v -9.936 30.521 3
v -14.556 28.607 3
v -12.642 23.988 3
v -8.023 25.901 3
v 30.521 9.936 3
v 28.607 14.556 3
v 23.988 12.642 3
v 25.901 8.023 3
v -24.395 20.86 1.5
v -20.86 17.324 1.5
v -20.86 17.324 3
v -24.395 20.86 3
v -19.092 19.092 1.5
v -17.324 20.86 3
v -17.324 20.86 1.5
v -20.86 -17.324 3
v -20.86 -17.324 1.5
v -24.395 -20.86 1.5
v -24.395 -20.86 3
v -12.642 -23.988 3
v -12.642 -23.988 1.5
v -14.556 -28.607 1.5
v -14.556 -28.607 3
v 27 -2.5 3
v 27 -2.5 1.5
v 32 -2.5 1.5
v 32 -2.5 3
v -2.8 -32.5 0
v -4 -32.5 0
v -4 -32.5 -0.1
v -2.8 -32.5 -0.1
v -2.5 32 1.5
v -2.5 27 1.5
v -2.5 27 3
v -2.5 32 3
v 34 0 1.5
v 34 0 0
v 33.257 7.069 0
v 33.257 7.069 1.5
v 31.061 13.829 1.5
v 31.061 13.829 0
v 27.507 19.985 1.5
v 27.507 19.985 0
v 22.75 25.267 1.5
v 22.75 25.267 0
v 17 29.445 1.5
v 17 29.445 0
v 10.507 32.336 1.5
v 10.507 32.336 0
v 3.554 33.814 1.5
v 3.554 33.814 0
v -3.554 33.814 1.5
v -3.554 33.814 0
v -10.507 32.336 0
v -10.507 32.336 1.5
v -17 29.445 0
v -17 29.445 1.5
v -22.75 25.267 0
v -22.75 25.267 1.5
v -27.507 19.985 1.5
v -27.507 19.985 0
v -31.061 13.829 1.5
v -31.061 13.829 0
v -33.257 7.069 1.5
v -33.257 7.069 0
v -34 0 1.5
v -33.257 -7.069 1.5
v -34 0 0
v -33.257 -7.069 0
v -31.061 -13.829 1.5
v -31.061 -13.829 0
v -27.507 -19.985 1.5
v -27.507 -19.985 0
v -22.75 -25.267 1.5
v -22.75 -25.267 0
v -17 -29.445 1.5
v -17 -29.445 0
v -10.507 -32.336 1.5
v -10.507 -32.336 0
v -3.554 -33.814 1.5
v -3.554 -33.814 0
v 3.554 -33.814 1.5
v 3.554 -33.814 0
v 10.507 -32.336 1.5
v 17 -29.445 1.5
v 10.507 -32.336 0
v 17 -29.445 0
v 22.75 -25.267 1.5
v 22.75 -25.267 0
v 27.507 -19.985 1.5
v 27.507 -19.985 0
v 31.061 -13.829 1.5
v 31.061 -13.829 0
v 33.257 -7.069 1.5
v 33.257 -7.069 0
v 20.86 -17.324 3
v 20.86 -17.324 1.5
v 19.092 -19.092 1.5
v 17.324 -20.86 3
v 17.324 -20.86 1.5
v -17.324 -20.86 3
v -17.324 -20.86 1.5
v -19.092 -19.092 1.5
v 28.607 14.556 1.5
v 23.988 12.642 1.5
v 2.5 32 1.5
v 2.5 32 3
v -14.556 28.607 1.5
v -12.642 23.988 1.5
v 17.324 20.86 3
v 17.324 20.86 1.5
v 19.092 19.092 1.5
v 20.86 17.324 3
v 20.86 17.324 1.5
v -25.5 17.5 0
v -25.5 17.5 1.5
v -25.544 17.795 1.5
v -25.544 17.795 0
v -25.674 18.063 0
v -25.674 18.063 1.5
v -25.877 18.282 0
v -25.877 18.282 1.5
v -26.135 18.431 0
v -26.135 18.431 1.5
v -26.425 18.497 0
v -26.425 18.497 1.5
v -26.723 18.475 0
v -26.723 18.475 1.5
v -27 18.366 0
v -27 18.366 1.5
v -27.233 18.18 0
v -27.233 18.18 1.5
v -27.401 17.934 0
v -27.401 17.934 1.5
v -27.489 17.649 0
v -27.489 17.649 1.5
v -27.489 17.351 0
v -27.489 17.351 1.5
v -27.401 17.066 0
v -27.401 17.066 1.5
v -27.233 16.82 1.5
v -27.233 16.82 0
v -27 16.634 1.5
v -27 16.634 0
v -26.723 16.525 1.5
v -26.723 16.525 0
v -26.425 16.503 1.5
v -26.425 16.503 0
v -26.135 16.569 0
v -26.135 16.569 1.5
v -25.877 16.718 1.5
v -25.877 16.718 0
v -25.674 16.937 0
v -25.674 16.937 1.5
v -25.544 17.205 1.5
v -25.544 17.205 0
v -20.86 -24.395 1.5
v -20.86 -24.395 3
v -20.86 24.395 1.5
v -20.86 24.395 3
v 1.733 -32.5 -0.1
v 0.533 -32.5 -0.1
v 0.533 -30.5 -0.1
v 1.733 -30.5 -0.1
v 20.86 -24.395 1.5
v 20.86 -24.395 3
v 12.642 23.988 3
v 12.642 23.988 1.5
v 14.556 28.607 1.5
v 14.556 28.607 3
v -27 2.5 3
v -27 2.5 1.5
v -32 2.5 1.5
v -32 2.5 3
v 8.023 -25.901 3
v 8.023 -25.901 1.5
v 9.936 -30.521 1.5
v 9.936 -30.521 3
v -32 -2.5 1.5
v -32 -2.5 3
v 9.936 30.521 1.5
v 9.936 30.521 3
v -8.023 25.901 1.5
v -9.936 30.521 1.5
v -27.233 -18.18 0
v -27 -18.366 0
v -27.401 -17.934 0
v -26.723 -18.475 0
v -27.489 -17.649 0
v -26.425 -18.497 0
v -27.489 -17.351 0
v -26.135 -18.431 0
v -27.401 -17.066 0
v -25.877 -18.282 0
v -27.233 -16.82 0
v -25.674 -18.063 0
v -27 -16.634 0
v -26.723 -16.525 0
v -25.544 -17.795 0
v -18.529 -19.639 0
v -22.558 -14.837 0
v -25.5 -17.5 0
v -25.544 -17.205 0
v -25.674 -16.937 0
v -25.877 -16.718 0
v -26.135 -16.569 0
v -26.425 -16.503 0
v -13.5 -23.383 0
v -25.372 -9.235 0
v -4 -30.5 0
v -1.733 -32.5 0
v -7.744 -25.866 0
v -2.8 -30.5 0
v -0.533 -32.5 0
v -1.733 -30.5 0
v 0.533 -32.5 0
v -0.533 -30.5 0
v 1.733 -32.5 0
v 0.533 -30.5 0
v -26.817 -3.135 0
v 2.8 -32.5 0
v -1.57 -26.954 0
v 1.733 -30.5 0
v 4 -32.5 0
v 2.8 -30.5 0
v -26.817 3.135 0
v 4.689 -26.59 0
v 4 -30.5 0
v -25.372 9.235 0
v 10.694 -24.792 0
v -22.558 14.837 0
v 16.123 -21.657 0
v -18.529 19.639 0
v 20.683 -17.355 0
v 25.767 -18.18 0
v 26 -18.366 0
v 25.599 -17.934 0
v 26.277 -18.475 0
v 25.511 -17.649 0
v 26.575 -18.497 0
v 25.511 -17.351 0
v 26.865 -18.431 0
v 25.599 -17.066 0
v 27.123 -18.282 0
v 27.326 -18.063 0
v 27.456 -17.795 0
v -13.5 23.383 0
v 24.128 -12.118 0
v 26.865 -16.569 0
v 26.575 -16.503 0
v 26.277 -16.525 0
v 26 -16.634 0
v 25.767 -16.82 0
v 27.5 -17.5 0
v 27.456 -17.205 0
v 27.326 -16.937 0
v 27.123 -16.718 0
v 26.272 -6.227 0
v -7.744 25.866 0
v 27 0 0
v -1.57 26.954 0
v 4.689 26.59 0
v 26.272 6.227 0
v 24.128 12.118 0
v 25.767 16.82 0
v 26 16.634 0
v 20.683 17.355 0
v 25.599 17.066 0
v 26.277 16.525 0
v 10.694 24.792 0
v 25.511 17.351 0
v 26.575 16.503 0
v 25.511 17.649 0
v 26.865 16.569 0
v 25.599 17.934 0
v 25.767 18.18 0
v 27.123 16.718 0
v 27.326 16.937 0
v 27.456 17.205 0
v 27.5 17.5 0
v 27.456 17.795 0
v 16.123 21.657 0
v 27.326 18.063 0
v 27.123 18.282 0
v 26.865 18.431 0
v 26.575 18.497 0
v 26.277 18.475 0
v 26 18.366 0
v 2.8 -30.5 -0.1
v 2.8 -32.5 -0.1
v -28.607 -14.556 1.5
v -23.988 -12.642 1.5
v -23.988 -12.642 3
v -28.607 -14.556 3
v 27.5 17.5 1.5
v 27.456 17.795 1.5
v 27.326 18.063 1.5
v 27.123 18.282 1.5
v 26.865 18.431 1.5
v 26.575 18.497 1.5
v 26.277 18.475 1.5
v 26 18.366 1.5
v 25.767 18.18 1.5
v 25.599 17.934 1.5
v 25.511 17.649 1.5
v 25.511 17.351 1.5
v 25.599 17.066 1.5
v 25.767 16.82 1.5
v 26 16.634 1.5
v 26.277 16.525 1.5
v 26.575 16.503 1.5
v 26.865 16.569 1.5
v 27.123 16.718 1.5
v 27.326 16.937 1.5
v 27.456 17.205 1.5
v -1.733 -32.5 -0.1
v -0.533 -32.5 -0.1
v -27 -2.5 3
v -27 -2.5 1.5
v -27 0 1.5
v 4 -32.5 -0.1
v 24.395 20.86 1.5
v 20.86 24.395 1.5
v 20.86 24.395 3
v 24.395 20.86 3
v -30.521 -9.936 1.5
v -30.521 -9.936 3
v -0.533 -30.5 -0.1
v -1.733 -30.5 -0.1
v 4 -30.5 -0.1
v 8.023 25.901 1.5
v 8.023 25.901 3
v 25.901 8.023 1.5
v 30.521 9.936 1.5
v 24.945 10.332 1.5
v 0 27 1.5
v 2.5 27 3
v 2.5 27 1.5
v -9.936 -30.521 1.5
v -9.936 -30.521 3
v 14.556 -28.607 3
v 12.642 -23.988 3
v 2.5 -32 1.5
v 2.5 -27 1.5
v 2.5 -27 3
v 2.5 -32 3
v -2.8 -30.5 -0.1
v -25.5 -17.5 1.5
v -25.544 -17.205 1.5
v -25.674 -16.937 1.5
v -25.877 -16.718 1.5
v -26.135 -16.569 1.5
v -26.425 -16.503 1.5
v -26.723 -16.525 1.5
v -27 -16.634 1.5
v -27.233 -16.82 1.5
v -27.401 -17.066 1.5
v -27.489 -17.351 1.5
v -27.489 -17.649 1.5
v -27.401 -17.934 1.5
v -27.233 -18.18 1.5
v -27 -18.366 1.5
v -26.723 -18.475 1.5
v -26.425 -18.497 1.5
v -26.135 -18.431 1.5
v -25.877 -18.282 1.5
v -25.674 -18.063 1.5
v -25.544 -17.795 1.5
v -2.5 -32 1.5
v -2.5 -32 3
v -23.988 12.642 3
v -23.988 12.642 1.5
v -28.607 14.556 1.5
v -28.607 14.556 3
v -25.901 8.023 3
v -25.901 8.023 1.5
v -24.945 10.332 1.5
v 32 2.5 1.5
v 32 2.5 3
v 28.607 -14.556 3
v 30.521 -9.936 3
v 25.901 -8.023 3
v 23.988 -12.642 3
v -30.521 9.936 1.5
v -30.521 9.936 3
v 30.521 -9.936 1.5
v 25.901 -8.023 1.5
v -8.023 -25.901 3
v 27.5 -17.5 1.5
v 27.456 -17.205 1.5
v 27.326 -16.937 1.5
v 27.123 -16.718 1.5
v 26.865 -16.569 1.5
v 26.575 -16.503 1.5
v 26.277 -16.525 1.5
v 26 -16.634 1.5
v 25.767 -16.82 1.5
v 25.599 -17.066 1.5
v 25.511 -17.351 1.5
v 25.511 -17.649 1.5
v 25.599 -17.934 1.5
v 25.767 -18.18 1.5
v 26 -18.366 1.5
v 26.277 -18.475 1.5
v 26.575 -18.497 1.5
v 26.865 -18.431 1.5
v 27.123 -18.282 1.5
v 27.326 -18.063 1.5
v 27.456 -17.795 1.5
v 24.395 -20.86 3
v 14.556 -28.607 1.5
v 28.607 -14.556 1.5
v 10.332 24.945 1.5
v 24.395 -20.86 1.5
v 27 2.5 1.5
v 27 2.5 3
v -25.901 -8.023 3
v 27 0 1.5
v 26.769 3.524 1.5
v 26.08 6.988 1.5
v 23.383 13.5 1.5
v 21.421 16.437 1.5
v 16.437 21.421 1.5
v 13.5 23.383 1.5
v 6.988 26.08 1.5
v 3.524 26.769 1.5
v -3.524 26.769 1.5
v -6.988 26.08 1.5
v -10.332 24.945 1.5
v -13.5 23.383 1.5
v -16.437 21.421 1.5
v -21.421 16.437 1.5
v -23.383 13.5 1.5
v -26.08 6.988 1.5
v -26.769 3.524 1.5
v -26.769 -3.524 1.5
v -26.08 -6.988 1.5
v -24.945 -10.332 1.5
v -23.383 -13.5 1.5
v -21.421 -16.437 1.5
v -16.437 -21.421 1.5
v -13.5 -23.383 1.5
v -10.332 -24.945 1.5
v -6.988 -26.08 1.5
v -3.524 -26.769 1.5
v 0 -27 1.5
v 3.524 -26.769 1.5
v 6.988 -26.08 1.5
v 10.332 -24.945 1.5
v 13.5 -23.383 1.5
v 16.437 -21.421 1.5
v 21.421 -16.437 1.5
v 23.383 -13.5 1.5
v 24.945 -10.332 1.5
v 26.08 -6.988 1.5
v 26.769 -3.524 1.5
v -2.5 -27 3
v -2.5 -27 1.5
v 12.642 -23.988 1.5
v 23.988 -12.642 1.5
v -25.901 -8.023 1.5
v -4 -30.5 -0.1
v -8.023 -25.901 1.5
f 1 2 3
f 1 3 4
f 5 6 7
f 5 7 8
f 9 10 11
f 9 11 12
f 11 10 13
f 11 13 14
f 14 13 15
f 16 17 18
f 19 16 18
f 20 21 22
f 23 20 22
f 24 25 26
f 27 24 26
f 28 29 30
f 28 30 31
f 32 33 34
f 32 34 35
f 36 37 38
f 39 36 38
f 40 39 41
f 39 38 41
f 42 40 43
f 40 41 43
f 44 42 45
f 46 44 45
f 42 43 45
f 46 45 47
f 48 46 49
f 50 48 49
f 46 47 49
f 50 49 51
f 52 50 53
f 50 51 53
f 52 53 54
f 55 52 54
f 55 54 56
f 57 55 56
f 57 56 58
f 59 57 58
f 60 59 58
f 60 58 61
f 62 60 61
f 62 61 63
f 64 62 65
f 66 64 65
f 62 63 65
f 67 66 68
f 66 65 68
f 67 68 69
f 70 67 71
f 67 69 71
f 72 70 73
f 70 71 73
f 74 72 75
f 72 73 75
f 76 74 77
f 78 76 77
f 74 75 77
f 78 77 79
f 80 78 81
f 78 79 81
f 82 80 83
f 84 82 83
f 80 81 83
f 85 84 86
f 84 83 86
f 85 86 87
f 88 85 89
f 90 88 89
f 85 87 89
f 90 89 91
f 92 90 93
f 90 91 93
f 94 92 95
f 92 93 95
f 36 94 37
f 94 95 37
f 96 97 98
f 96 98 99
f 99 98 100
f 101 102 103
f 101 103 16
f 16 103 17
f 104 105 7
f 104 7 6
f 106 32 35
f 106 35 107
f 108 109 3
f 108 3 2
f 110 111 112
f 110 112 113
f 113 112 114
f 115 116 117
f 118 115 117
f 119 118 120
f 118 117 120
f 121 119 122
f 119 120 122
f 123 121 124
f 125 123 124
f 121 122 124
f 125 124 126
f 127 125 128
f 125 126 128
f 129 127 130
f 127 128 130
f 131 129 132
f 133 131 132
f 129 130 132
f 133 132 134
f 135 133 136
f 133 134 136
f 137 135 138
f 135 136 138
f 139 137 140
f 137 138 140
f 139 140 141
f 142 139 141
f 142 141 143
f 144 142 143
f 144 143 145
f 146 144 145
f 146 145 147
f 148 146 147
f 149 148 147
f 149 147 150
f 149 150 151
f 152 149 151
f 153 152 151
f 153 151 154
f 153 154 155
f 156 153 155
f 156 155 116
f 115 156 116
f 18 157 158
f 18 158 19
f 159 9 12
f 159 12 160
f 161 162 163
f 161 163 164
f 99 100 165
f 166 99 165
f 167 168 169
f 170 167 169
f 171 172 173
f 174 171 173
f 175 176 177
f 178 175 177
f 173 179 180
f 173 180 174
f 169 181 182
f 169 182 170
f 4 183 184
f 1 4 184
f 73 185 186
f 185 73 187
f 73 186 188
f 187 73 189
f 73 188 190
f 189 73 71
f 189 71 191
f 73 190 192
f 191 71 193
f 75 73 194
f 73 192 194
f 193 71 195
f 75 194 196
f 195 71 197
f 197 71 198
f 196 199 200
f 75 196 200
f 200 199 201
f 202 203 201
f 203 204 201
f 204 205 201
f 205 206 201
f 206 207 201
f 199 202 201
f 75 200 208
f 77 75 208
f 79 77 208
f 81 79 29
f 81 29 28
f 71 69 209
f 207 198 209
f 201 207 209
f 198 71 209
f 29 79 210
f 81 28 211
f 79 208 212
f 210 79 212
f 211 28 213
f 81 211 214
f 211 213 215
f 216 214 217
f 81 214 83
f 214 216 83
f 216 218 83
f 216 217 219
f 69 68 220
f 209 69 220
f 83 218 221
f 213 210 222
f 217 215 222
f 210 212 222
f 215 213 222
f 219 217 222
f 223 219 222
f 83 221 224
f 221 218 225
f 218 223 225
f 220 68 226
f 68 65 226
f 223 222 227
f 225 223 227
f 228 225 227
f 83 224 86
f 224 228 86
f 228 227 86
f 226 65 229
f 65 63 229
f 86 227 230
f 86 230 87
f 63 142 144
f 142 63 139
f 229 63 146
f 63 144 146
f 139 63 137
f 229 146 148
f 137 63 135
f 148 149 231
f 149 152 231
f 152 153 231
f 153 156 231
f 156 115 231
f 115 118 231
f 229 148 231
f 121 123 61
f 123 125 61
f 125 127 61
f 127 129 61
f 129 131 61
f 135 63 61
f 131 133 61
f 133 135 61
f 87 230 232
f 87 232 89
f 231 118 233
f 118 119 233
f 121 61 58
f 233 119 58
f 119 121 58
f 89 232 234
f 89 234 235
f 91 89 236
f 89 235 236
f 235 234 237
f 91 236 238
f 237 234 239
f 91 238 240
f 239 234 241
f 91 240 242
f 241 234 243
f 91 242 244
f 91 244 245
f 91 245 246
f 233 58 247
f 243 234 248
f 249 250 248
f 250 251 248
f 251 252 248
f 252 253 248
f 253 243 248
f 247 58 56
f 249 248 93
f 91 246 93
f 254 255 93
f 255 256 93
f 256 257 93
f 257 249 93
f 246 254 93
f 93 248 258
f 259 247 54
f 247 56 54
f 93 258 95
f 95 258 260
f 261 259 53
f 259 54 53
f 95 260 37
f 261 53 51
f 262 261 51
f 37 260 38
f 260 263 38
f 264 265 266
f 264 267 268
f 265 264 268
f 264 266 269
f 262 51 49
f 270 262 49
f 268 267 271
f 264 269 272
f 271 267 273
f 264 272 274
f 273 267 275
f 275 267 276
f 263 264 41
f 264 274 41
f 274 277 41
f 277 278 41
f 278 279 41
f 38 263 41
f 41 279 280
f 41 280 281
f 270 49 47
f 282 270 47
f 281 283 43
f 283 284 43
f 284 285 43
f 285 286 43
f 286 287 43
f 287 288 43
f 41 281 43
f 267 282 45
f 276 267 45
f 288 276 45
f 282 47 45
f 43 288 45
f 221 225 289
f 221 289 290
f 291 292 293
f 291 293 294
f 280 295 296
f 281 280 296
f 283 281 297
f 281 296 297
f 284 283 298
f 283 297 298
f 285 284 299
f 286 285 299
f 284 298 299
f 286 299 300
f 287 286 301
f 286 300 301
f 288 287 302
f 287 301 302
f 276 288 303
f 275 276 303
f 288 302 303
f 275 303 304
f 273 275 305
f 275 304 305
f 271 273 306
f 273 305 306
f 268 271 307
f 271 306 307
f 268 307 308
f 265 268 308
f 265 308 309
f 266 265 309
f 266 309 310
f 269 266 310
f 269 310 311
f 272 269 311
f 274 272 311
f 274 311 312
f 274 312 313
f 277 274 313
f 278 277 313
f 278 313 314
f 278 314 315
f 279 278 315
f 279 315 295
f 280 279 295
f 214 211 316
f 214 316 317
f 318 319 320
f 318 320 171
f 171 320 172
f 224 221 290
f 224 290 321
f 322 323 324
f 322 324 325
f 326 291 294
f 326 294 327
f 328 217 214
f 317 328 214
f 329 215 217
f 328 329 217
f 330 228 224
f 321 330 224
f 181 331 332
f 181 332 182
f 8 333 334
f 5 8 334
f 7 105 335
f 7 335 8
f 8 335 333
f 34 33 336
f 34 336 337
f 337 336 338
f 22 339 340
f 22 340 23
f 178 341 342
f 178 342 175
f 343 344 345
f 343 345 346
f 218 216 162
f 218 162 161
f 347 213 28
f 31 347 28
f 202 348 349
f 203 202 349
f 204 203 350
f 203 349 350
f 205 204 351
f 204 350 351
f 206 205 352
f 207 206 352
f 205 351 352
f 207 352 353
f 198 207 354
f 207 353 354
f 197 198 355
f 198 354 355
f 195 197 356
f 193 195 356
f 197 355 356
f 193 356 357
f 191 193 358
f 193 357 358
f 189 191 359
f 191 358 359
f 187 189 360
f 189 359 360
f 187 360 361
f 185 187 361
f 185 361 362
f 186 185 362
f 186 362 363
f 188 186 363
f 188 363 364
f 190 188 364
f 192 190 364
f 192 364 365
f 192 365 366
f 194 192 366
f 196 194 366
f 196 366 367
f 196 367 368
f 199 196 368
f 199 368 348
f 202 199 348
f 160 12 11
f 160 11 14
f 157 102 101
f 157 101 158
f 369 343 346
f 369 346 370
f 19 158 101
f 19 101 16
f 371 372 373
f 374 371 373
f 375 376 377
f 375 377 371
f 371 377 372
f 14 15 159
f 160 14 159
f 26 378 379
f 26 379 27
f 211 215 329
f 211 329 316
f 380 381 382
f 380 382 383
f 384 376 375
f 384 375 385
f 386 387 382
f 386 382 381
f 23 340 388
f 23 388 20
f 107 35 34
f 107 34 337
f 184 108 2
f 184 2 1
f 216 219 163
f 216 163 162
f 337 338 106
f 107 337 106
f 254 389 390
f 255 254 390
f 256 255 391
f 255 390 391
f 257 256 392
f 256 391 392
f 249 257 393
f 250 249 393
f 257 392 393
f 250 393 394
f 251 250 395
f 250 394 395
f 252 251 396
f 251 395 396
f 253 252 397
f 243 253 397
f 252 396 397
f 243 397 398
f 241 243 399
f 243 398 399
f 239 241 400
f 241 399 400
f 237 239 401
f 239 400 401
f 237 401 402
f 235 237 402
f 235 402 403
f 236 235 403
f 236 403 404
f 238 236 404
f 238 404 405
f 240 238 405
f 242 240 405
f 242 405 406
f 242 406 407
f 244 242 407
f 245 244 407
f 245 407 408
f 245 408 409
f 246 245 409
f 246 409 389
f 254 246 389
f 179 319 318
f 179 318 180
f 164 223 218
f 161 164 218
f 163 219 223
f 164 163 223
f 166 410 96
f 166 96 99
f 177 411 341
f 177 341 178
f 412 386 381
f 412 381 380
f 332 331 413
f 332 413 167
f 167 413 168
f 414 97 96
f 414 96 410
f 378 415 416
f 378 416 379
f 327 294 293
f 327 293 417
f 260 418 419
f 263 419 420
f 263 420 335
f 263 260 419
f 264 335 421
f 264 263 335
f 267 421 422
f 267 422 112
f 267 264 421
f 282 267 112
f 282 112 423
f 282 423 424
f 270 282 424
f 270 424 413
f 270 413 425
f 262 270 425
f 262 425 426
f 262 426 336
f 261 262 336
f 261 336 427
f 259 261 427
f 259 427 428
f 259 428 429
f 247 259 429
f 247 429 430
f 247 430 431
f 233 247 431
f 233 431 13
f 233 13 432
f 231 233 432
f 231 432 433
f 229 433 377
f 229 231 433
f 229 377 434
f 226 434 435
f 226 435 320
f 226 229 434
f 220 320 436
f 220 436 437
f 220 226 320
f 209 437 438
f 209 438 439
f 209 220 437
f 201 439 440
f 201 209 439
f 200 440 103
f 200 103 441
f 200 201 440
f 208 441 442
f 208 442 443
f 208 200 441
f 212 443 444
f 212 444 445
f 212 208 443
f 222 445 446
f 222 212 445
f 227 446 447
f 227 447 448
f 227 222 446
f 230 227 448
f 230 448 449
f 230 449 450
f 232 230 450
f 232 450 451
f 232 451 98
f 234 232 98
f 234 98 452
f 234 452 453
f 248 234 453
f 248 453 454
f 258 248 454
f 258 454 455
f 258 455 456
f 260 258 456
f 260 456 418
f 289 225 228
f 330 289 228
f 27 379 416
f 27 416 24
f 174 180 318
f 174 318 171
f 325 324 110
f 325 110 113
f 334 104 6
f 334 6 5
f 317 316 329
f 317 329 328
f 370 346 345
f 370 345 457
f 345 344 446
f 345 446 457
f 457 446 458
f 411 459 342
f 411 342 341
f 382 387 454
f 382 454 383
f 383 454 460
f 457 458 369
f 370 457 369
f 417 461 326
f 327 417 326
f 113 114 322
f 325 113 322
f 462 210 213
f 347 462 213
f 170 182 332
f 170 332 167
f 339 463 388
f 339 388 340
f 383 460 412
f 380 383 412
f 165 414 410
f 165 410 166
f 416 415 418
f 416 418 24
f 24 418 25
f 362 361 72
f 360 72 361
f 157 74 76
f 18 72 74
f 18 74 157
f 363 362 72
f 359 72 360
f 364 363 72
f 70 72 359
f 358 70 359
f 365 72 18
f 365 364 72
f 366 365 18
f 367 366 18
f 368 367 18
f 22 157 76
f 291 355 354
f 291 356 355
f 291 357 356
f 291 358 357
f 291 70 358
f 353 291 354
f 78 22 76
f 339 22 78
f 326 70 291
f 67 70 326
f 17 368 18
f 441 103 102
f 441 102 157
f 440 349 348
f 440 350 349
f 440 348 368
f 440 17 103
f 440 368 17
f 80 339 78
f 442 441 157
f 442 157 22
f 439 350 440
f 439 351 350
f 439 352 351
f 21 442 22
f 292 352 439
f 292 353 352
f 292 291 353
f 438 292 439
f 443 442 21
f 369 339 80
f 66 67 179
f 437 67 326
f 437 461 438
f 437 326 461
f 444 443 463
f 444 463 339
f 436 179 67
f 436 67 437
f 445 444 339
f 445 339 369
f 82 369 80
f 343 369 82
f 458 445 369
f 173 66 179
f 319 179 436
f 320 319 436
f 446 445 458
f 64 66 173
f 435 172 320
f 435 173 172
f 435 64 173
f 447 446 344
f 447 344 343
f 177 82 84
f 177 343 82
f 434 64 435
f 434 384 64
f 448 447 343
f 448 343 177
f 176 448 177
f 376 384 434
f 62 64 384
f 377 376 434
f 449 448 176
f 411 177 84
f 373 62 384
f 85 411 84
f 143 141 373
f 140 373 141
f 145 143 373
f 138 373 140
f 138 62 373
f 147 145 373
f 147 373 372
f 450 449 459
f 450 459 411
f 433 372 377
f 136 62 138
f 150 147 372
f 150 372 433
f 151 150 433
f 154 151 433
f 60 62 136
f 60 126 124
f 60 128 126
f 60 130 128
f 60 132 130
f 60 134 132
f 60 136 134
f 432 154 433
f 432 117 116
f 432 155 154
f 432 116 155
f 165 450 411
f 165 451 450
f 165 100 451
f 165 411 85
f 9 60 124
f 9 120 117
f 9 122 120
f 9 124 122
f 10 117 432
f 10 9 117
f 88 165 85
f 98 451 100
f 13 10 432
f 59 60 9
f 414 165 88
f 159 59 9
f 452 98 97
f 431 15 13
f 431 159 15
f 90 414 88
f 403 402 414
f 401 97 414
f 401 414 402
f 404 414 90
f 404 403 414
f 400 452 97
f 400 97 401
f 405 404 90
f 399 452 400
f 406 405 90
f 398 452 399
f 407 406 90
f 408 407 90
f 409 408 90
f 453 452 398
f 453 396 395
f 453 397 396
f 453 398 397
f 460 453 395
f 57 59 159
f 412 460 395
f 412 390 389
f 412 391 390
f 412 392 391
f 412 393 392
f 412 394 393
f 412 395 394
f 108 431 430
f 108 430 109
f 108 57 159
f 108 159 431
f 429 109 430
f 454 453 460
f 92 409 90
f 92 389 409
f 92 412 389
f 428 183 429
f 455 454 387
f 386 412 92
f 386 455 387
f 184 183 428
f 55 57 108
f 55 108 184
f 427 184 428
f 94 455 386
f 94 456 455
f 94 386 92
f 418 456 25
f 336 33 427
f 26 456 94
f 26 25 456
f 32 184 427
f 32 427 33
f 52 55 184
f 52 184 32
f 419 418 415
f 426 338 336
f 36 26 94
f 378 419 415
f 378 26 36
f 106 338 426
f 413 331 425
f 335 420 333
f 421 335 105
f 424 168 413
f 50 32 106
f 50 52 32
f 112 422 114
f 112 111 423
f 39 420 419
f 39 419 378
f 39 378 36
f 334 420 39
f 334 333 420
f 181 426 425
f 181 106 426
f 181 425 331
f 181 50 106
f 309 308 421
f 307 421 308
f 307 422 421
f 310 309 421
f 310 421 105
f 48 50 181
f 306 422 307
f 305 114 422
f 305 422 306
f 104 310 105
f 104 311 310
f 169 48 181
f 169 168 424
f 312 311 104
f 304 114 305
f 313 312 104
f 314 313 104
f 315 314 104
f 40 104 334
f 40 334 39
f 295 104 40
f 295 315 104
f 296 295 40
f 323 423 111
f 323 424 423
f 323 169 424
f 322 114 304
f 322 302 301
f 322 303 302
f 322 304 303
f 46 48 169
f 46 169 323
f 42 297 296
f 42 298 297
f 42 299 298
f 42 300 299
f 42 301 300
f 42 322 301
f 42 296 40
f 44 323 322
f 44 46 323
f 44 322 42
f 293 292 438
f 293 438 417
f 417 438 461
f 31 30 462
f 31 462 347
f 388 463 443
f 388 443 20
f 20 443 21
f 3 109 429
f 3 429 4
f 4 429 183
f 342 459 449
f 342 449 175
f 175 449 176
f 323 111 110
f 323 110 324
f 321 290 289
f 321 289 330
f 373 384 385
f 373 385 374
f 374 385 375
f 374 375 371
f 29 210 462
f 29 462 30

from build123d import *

# Parameters (mm, degrees)
SKETCH_R           = 34
SKETCH_R_2         = 27
PAD_DEPTH          = 1.5
SKETCH001_W        = 1.2
SKETCH001_H        = 2
PAD001_DEPTH       = 0.1
SKETCH002_R        = 1
POCKET_DEPTH       = 1.601
SKETCH003_W        = 5
SKETCH003_H        = 5
PAD002_DEPTH       = 1.5
POLARPATTERN_COUNT = 16


with BuildPart() as part:
    # Sketch → Pad (new body)
    with BuildSketch(Plane.XY):
        Circle(SKETCH_R)
        Circle(SKETCH_R_2, mode=Mode.SUBTRACT)
    extrude(amount=PAD_DEPTH)

    # Sketch001 (on Face3 of Pad) → Pad001 (join)
    with BuildSketch(Plane(origin=(0, 0, 0), x_dir=(1, 0, 0), z_dir=(0, 0, -1))):
        with Locations((-3.4, 31.5)):
            Rectangle(SKETCH001_W, SKETCH001_H)
        with Locations((-1.133333, 31.5)):
            Rectangle(SKETCH001_W, SKETCH001_H)
        with Locations((1.133333, 31.5)):
            Rectangle(SKETCH001_W, SKETCH001_H)
        with Locations((3.4, 31.5)):
            Rectangle(SKETCH001_W, SKETCH001_H)
    extrude(amount=PAD001_DEPTH)

    # Sketch002 (on Face3 of Pad001) → Pocket (cut, through all)
    with BuildSketch(Plane.XY.offset(1.5)):
        with Locations((-26.5, 17.5)):
            Circle(SKETCH002_R)
        with Locations((26.5, 17.5)):
            Circle(SKETCH002_R)
        with Locations((26.5, -17.5)):
            Circle(SKETCH002_R)
        with Locations((-26.5, -17.5)):
            Circle(SKETCH002_R)
    extrude(amount=-POCKET_DEPTH, mode=Mode.SUBTRACT)

    # Sketch003 (on Face3 of Pocket) → Pad002 (join)
    with BuildSketch(Plane.XY.offset(1.5)):
        with Locations((0, 29.5)):
            Rectangle(SKETCH003_W, SKETCH003_H)
    pad002 = extrude(amount=PAD002_DEPTH)

    # PolarPattern: Pad002 ×16 about axis
    polarpattern_axis = Axis((0, 0, 1.5), (0, 0, 1))
    for i in range(1, POLARPATTERN_COUNT):
        add(pad002.rotate(polarpattern_axis, i * 360 / POLARPATTERN_COUNT))


solid = part.part
